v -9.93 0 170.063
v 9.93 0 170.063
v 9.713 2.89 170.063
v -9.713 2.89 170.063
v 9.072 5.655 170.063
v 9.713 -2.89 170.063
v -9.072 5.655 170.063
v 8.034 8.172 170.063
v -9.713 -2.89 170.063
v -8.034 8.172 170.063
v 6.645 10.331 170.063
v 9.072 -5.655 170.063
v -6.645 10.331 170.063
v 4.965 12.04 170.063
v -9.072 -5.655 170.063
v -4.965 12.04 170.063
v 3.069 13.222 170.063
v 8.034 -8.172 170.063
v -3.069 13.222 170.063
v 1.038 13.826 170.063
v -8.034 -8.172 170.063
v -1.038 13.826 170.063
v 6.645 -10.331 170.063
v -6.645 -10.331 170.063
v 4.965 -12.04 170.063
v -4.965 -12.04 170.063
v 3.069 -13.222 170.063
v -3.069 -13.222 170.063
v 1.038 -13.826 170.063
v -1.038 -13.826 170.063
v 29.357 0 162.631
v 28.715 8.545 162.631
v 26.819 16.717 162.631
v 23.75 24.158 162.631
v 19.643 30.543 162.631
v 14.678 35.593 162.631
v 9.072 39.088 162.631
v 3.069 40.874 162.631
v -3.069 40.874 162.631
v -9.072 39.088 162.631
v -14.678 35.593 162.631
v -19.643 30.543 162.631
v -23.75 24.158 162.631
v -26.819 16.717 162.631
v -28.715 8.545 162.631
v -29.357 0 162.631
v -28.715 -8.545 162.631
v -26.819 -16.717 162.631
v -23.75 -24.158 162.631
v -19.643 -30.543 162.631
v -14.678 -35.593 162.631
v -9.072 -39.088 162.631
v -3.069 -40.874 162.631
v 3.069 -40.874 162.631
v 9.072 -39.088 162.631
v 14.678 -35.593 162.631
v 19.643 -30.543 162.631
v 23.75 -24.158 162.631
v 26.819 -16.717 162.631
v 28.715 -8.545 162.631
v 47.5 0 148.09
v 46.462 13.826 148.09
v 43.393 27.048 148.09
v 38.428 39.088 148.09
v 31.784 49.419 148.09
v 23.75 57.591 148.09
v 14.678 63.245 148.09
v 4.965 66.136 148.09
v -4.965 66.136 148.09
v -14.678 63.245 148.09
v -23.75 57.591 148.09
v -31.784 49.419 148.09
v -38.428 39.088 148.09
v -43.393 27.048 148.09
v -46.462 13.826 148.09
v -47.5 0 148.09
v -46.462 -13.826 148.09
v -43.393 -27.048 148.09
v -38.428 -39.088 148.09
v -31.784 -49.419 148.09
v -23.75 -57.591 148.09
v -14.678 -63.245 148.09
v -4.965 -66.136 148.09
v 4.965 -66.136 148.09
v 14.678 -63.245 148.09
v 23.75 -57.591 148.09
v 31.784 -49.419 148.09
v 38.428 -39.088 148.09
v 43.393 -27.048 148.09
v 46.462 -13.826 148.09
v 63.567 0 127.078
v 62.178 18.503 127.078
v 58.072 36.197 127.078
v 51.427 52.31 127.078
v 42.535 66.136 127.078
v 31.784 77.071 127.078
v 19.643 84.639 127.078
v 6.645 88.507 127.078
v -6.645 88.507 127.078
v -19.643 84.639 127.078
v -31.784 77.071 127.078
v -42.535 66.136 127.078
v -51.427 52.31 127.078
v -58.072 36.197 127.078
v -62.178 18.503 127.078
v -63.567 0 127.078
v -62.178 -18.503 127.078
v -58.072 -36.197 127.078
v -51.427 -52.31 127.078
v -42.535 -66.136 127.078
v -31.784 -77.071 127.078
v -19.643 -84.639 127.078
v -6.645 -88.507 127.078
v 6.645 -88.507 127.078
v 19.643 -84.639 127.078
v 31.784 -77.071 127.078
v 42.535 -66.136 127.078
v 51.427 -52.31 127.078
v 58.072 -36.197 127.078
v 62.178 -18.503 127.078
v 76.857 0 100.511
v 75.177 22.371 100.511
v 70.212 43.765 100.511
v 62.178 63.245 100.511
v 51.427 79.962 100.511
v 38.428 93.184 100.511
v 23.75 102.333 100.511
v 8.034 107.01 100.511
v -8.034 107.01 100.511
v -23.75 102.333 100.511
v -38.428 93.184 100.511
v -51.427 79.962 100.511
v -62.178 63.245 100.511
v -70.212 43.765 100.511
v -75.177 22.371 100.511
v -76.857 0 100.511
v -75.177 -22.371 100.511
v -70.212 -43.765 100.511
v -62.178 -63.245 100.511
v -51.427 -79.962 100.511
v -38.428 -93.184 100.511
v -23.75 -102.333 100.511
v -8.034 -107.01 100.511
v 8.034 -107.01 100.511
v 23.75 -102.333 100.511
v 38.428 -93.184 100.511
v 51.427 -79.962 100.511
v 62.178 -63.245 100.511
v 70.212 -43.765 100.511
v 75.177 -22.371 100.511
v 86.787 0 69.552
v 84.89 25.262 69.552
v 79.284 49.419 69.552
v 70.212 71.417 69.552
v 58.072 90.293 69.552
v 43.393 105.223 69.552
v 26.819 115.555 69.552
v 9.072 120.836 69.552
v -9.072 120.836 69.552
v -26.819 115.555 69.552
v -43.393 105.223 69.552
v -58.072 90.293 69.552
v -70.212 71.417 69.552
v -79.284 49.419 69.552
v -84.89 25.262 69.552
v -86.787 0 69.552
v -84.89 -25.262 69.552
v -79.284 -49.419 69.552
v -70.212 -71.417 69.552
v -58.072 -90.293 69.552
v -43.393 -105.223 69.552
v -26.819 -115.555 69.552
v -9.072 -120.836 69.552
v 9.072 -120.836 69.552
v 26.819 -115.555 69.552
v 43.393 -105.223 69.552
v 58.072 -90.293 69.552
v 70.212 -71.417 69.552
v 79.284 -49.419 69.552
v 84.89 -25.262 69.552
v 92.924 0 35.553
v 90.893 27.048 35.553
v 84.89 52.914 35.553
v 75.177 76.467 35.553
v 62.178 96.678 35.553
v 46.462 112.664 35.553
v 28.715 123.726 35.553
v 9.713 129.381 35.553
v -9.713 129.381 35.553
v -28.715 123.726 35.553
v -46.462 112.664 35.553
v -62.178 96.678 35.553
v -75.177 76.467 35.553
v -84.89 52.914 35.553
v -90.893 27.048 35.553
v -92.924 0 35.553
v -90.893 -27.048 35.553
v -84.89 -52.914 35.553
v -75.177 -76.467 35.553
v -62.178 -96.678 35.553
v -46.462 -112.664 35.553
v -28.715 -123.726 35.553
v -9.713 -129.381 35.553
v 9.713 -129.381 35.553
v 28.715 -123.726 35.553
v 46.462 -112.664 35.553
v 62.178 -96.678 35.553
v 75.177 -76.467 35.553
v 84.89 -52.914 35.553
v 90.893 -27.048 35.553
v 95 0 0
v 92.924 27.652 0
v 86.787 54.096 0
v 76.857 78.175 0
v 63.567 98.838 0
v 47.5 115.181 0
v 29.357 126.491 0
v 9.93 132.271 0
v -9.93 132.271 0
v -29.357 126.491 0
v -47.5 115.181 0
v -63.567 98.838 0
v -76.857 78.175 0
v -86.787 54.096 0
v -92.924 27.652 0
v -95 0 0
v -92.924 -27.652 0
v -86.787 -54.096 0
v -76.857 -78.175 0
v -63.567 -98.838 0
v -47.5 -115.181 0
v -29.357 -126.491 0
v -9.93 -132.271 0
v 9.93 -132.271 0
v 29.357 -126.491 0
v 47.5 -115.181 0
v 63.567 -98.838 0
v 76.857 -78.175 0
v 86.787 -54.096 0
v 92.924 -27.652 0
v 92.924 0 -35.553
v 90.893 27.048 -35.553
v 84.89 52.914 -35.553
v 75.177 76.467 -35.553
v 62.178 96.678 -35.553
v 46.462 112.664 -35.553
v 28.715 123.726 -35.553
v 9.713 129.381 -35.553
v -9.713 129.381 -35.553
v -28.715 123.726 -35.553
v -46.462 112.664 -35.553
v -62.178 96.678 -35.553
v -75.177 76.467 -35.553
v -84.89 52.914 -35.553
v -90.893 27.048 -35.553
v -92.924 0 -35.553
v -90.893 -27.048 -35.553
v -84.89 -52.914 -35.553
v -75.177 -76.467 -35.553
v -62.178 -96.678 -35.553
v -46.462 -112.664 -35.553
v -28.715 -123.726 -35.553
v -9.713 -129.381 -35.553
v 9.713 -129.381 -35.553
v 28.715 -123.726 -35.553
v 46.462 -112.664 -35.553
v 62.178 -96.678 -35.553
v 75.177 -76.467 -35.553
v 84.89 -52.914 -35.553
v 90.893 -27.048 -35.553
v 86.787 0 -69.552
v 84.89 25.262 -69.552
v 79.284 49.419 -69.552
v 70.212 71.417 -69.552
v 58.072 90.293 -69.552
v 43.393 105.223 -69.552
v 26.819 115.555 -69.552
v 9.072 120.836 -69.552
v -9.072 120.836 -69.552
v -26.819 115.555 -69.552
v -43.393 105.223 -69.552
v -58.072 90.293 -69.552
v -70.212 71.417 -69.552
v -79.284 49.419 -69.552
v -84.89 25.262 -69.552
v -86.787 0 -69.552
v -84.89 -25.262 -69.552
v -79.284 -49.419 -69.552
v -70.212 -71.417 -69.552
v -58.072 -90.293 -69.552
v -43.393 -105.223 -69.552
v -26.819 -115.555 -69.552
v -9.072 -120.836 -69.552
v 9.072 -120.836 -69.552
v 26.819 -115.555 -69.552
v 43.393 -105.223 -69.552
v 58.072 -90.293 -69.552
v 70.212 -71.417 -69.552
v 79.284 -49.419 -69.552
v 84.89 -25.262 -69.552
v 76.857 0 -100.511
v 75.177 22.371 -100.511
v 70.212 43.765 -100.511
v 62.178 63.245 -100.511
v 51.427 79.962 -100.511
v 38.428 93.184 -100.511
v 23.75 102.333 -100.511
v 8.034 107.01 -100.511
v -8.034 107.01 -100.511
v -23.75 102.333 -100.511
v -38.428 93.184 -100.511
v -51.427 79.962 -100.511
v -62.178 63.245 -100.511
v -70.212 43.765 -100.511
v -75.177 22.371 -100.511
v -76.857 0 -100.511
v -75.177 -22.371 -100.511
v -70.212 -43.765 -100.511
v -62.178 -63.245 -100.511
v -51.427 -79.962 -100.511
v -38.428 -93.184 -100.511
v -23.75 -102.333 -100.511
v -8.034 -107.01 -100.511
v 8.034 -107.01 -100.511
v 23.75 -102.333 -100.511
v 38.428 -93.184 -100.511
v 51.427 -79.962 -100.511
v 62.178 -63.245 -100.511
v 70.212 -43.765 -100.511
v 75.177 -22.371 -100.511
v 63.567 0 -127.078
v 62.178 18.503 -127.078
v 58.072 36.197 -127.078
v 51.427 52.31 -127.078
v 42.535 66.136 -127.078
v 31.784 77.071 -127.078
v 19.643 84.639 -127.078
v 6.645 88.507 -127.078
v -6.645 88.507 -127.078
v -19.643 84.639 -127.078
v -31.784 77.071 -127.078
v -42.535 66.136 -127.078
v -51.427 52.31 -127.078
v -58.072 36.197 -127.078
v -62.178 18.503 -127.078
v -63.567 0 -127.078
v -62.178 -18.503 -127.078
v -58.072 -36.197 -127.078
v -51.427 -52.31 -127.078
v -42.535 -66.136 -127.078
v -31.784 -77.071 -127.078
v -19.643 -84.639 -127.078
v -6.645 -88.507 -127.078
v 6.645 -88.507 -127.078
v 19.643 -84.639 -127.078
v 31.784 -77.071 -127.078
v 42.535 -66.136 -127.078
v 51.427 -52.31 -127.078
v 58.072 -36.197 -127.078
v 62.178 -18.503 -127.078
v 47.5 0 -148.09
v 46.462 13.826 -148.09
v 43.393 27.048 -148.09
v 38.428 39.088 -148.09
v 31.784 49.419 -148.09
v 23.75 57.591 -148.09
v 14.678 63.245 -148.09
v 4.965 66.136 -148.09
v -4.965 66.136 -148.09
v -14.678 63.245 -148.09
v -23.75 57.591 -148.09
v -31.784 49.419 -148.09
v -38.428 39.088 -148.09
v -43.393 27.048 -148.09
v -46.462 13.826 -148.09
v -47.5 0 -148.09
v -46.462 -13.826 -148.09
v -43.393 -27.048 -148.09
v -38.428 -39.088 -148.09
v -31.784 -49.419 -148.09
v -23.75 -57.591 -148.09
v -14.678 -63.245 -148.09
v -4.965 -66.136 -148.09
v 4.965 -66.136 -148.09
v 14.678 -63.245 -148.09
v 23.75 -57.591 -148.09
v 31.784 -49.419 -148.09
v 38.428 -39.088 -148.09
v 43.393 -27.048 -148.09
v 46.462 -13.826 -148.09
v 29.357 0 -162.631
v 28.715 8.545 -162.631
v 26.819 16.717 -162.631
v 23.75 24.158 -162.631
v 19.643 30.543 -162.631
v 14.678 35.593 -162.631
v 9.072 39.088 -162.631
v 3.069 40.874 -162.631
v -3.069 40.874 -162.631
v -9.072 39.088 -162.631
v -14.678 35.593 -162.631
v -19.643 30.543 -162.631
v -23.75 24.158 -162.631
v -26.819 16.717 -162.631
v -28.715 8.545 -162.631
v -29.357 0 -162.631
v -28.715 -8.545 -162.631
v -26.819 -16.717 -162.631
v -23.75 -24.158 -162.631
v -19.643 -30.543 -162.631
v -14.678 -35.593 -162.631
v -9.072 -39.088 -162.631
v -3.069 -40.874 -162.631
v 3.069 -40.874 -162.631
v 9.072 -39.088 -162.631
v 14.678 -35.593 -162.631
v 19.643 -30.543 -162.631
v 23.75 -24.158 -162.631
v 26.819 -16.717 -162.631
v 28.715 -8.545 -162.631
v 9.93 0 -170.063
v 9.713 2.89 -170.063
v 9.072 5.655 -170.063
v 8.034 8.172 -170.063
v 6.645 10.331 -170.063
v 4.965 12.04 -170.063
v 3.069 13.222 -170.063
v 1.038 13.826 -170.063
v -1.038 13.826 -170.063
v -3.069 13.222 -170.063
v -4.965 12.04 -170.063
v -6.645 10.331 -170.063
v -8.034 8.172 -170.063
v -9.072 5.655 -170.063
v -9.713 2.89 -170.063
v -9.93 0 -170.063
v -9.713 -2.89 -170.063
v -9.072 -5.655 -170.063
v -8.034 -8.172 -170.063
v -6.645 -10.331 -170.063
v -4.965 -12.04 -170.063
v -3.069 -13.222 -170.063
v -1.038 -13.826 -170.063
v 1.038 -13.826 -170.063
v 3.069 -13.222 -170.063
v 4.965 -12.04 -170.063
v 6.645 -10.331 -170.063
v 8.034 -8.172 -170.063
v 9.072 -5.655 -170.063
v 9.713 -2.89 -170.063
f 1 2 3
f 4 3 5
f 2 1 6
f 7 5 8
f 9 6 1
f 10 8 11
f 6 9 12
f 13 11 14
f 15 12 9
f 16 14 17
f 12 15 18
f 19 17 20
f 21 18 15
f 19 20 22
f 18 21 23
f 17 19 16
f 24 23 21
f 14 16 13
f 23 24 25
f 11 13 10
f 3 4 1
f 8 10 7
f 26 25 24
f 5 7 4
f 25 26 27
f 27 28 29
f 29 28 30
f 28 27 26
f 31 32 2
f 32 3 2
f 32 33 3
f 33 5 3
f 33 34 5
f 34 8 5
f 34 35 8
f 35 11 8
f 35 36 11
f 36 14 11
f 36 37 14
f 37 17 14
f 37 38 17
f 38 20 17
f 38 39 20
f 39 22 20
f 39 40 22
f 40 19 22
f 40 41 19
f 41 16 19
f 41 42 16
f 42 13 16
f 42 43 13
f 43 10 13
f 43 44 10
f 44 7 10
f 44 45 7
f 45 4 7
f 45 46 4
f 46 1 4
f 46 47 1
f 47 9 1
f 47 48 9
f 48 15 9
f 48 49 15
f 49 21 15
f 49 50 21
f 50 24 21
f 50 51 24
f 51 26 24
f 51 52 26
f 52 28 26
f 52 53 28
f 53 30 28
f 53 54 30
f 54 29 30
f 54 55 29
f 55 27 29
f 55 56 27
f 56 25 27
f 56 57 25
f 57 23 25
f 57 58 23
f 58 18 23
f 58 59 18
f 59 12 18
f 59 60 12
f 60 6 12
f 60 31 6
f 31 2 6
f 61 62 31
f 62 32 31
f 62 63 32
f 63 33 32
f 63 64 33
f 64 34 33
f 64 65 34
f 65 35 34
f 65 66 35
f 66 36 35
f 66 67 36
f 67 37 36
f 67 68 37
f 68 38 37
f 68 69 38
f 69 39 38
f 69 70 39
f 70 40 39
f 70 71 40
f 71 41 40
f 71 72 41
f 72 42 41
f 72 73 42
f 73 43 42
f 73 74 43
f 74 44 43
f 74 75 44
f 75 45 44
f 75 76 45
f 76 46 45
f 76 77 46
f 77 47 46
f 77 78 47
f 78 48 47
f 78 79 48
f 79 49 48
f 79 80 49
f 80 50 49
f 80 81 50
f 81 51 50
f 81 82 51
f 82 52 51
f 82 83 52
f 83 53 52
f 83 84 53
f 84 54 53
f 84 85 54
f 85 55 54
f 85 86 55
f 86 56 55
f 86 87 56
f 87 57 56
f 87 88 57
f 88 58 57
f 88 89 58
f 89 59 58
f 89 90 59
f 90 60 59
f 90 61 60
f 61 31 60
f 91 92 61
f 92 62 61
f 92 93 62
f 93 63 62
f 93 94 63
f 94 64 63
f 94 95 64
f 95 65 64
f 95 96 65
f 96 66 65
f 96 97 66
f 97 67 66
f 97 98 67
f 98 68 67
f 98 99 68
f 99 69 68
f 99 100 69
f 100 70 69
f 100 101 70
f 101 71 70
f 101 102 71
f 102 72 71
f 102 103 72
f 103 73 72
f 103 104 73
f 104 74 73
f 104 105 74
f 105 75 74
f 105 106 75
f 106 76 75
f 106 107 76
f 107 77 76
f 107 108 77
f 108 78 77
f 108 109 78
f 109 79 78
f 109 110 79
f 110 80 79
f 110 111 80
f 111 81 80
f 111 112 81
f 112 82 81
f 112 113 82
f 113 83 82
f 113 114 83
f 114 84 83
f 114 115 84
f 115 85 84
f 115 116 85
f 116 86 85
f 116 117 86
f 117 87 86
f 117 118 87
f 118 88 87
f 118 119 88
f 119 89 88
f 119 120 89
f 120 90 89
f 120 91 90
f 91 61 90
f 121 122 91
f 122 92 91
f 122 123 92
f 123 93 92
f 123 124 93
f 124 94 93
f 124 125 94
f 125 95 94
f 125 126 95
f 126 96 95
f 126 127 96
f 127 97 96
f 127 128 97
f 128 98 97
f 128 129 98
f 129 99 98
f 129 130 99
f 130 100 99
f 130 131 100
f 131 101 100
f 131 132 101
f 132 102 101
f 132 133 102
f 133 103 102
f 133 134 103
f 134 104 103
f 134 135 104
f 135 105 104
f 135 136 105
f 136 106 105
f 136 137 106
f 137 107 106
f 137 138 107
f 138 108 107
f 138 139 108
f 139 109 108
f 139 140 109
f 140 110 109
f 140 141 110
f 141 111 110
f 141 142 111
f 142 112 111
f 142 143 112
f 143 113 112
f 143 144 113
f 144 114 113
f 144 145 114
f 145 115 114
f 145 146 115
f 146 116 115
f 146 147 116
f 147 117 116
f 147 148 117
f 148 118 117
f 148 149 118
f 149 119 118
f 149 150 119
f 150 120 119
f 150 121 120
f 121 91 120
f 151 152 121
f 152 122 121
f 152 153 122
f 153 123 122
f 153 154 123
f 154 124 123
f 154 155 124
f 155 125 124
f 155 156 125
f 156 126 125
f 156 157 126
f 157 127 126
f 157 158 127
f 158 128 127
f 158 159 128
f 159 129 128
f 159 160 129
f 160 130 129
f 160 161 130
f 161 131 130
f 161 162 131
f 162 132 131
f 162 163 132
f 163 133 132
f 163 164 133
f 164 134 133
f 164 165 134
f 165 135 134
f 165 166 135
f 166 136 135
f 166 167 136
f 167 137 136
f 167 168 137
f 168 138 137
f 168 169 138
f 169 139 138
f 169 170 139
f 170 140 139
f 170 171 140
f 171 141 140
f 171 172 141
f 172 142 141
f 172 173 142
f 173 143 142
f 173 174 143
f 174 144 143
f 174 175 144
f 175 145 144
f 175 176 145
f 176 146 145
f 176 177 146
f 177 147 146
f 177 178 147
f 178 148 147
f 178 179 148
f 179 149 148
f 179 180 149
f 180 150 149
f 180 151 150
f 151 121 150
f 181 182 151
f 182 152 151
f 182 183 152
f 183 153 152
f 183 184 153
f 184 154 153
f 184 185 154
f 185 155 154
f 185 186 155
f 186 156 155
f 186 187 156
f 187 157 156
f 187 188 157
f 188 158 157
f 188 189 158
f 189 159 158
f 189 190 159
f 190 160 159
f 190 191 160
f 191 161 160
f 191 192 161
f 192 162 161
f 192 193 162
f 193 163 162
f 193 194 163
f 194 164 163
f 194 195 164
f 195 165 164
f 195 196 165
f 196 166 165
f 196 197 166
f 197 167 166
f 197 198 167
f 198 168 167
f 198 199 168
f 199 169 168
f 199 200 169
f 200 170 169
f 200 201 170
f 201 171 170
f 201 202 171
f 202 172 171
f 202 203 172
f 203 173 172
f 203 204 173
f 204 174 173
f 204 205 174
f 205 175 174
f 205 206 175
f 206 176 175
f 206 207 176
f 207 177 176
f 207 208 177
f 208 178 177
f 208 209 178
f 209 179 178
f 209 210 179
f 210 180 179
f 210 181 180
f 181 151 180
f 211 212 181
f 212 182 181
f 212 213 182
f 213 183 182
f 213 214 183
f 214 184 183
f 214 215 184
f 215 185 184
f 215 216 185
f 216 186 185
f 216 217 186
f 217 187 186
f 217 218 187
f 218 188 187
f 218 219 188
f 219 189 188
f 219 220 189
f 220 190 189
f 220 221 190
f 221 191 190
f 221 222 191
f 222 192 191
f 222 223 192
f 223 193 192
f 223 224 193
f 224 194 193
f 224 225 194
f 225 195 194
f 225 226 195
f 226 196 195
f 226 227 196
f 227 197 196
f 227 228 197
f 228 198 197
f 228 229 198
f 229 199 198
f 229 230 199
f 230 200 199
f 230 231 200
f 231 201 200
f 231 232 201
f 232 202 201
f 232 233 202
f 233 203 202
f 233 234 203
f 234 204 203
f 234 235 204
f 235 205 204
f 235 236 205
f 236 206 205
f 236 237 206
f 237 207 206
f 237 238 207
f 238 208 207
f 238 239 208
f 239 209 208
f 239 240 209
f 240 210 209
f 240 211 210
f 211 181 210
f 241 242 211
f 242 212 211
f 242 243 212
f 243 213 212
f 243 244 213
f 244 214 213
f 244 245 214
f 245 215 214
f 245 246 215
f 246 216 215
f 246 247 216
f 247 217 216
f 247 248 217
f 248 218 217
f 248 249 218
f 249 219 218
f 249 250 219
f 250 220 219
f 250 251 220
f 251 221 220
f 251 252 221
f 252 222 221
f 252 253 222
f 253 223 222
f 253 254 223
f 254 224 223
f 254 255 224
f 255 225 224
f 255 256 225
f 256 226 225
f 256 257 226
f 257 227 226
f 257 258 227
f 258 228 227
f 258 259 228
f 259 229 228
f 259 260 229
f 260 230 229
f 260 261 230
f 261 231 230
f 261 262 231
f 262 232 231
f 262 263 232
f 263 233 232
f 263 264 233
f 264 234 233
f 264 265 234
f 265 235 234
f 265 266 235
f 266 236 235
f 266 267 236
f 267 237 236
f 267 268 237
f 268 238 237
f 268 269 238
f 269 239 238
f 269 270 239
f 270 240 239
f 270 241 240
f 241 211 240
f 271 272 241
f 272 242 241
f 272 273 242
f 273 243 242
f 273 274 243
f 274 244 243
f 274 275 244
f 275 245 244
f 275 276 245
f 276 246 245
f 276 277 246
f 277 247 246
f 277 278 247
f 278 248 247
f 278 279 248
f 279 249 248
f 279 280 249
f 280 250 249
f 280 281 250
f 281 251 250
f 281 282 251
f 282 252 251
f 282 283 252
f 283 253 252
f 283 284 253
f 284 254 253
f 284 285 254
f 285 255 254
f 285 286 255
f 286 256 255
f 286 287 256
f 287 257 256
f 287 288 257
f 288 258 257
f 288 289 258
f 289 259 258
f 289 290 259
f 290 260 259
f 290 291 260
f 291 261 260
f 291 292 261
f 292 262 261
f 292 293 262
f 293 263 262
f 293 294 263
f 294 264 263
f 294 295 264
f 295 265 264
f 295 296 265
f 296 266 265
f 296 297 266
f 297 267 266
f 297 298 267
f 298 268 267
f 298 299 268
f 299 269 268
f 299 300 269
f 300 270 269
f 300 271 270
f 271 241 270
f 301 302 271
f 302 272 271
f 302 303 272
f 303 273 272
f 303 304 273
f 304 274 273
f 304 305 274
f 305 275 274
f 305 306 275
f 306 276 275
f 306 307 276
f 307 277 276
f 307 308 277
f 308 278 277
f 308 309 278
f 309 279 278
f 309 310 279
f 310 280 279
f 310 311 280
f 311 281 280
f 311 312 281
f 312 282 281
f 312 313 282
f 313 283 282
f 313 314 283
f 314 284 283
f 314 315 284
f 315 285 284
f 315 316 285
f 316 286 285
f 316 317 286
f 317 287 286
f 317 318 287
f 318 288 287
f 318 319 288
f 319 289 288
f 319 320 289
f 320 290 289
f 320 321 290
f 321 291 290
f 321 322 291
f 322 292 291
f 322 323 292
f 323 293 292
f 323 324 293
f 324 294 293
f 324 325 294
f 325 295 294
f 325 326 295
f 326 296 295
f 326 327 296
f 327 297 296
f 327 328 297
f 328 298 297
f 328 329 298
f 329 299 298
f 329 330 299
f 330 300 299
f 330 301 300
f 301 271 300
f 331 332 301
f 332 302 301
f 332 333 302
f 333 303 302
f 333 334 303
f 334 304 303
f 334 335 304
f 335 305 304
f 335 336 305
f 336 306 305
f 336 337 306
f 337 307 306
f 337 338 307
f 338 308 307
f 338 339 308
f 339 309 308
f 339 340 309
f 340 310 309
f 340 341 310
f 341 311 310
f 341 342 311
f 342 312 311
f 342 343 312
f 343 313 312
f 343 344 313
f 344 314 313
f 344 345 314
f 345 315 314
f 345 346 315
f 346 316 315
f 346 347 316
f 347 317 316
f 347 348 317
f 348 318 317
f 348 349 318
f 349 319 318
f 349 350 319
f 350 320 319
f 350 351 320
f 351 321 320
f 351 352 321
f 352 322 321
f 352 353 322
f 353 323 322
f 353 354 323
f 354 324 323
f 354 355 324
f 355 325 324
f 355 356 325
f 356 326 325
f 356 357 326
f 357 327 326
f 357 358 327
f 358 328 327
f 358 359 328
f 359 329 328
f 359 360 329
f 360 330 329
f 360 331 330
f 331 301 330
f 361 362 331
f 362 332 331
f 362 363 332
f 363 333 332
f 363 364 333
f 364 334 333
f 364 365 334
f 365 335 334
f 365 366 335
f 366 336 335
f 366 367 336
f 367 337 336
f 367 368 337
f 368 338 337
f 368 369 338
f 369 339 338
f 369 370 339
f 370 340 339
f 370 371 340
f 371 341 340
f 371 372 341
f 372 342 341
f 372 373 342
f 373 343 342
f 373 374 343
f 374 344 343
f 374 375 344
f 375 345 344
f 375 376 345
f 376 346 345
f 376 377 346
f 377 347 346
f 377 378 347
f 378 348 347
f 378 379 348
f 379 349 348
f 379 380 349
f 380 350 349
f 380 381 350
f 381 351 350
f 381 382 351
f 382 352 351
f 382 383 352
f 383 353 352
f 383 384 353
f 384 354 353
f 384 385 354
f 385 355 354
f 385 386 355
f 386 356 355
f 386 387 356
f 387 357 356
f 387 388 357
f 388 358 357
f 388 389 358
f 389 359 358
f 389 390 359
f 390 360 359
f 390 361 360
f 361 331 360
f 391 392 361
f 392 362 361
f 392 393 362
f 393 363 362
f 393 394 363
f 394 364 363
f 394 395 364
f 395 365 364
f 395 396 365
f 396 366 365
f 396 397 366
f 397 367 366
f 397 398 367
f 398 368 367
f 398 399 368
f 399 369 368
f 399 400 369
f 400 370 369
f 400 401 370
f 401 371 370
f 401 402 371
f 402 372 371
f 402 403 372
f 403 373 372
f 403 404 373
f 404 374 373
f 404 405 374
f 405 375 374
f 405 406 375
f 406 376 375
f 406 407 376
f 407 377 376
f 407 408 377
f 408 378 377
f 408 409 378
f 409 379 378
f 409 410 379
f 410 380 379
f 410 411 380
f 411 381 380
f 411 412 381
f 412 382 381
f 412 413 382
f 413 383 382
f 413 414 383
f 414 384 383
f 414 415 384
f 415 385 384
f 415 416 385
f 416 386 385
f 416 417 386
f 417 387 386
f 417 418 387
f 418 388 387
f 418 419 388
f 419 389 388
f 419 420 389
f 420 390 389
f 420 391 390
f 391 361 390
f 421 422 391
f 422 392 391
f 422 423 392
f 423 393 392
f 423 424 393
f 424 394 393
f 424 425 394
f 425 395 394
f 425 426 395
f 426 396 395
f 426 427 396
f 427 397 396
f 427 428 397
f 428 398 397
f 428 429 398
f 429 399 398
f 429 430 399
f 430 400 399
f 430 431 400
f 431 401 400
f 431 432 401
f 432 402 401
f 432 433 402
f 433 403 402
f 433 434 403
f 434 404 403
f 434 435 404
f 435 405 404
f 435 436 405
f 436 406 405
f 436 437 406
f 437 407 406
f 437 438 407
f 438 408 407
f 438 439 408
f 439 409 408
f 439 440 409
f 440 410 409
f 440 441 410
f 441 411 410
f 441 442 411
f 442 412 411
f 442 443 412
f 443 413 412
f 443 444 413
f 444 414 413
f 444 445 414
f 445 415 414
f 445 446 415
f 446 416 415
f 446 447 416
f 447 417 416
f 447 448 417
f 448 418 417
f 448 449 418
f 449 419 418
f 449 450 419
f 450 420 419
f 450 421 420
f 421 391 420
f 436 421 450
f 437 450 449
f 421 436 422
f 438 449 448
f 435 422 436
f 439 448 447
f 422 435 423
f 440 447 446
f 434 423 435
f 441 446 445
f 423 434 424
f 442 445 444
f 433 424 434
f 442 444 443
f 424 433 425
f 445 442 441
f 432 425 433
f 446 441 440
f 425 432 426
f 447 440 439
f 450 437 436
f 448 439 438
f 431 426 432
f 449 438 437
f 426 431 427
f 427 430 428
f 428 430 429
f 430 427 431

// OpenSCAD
// Generated by SolidPython 1.0.1 on 2020-07-29 00:46:46


scale(v = [5, 7, 9]) {
	sphere(r = 19);
}
/***********************************************
*********      SolidPython code:      **********
************************************************
 
# import packages: SolidPython
from solid import *
from solid.utils import *
from itertools import chain, combinations, permutations


class Resize:

    def __init__(self, scad_file):
        self.scad_file = scad_file
        #self.scad_file = import_scad(scad_file)
        # cone/cylinder param:
        self.r1 = 0
        self.r2 = 0
        self.h = 0
        # rectangular prism param:
        self.w = 0
        self.l = 0
        # ellipse param:
        self.r = 0

    # import OpenScad code (file name corresponds to shape)


    # classify shape + parameters
    def assign(self, param1, param2, param3):
        if self.scad_file == 'cone.scad':
            self.r1 = param1
            self.r2 = param2
            self.h = param3
        elif self.scad_file == 'cylinder.scad':
            self.r1 = param1
            self.r2 = param2
            self.h = param3
        elif self.scad_file == 'rectangularPrism.scad':
            self.h = param1
            self.l = param2
            self.w = param3
        else:
            self.r = param1
            self.h = param2

    # resize parameters
    def iterate(self):
        x = range(3, 20, 2)
        i = 1
        if self.scad_file == 'cone.scad':
            tempList = list(permutations(x, 2))
            for temp in tempList:
                param1 = temp[0]
                param2 = temp[1]
                filepath = 'produced_scad_files/' + 'cone' + str(param1) + '_' + str(param2) + '_' + '.scad'
                scad_render_to_file(cylinder(h=param1, r1=param2, r2=0), filepath)

        elif self.scad_file == 'cylinder.scad':
            tempList = list(permutations(x, 3))
            for temp in tempList:
                param1 = temp[0]
                param2 = temp[1]
                filepath = 'produced_scad_files/' + 'cylinder' + str(param1) + '_' + str(param2) + '_' + '.scad'
                scad_render_to_file(cylinder(h=param1, r1=param2, r2=param2), filepath)

        elif self.scad_file == 'rectangularPrism.scad':
            tempList = list(permutations(x, 3))
            for temp in tempList:
                param1 = temp[0]
                param2 = temp[1]
                param3 = temp[2]
                filepath = 'produced_scad_files/' + 'rectangularPrism' + str(param1) + '_' + str(param2) + '_' + str(
                    param3) + '.scad'
                scad_render_to_file(cube(size=(param1, param2, param3)), filepath)

        elif self.scad_file == 'ellipse.scad':
            tempList = list(permutations(x, 4))
            for temp in tempList:
                param1 = temp[0]
                param2 = temp[1]
                param3 = temp[2]
                param4 = temp[3]
                filepath = 'produced_scad_files/' + 'ellipse' + str(param1) + '_' + str(param2) + '_' + str(param3) + '_' + str(param4) + '.scad'
                scad_render_to_file(scale([param1, param2, param3])(sphere(r=param4)), filepath)

    def render_to_scadfile(self):
        scad_render_to_file(scad, 'example.scad') 
 
************************************************/
